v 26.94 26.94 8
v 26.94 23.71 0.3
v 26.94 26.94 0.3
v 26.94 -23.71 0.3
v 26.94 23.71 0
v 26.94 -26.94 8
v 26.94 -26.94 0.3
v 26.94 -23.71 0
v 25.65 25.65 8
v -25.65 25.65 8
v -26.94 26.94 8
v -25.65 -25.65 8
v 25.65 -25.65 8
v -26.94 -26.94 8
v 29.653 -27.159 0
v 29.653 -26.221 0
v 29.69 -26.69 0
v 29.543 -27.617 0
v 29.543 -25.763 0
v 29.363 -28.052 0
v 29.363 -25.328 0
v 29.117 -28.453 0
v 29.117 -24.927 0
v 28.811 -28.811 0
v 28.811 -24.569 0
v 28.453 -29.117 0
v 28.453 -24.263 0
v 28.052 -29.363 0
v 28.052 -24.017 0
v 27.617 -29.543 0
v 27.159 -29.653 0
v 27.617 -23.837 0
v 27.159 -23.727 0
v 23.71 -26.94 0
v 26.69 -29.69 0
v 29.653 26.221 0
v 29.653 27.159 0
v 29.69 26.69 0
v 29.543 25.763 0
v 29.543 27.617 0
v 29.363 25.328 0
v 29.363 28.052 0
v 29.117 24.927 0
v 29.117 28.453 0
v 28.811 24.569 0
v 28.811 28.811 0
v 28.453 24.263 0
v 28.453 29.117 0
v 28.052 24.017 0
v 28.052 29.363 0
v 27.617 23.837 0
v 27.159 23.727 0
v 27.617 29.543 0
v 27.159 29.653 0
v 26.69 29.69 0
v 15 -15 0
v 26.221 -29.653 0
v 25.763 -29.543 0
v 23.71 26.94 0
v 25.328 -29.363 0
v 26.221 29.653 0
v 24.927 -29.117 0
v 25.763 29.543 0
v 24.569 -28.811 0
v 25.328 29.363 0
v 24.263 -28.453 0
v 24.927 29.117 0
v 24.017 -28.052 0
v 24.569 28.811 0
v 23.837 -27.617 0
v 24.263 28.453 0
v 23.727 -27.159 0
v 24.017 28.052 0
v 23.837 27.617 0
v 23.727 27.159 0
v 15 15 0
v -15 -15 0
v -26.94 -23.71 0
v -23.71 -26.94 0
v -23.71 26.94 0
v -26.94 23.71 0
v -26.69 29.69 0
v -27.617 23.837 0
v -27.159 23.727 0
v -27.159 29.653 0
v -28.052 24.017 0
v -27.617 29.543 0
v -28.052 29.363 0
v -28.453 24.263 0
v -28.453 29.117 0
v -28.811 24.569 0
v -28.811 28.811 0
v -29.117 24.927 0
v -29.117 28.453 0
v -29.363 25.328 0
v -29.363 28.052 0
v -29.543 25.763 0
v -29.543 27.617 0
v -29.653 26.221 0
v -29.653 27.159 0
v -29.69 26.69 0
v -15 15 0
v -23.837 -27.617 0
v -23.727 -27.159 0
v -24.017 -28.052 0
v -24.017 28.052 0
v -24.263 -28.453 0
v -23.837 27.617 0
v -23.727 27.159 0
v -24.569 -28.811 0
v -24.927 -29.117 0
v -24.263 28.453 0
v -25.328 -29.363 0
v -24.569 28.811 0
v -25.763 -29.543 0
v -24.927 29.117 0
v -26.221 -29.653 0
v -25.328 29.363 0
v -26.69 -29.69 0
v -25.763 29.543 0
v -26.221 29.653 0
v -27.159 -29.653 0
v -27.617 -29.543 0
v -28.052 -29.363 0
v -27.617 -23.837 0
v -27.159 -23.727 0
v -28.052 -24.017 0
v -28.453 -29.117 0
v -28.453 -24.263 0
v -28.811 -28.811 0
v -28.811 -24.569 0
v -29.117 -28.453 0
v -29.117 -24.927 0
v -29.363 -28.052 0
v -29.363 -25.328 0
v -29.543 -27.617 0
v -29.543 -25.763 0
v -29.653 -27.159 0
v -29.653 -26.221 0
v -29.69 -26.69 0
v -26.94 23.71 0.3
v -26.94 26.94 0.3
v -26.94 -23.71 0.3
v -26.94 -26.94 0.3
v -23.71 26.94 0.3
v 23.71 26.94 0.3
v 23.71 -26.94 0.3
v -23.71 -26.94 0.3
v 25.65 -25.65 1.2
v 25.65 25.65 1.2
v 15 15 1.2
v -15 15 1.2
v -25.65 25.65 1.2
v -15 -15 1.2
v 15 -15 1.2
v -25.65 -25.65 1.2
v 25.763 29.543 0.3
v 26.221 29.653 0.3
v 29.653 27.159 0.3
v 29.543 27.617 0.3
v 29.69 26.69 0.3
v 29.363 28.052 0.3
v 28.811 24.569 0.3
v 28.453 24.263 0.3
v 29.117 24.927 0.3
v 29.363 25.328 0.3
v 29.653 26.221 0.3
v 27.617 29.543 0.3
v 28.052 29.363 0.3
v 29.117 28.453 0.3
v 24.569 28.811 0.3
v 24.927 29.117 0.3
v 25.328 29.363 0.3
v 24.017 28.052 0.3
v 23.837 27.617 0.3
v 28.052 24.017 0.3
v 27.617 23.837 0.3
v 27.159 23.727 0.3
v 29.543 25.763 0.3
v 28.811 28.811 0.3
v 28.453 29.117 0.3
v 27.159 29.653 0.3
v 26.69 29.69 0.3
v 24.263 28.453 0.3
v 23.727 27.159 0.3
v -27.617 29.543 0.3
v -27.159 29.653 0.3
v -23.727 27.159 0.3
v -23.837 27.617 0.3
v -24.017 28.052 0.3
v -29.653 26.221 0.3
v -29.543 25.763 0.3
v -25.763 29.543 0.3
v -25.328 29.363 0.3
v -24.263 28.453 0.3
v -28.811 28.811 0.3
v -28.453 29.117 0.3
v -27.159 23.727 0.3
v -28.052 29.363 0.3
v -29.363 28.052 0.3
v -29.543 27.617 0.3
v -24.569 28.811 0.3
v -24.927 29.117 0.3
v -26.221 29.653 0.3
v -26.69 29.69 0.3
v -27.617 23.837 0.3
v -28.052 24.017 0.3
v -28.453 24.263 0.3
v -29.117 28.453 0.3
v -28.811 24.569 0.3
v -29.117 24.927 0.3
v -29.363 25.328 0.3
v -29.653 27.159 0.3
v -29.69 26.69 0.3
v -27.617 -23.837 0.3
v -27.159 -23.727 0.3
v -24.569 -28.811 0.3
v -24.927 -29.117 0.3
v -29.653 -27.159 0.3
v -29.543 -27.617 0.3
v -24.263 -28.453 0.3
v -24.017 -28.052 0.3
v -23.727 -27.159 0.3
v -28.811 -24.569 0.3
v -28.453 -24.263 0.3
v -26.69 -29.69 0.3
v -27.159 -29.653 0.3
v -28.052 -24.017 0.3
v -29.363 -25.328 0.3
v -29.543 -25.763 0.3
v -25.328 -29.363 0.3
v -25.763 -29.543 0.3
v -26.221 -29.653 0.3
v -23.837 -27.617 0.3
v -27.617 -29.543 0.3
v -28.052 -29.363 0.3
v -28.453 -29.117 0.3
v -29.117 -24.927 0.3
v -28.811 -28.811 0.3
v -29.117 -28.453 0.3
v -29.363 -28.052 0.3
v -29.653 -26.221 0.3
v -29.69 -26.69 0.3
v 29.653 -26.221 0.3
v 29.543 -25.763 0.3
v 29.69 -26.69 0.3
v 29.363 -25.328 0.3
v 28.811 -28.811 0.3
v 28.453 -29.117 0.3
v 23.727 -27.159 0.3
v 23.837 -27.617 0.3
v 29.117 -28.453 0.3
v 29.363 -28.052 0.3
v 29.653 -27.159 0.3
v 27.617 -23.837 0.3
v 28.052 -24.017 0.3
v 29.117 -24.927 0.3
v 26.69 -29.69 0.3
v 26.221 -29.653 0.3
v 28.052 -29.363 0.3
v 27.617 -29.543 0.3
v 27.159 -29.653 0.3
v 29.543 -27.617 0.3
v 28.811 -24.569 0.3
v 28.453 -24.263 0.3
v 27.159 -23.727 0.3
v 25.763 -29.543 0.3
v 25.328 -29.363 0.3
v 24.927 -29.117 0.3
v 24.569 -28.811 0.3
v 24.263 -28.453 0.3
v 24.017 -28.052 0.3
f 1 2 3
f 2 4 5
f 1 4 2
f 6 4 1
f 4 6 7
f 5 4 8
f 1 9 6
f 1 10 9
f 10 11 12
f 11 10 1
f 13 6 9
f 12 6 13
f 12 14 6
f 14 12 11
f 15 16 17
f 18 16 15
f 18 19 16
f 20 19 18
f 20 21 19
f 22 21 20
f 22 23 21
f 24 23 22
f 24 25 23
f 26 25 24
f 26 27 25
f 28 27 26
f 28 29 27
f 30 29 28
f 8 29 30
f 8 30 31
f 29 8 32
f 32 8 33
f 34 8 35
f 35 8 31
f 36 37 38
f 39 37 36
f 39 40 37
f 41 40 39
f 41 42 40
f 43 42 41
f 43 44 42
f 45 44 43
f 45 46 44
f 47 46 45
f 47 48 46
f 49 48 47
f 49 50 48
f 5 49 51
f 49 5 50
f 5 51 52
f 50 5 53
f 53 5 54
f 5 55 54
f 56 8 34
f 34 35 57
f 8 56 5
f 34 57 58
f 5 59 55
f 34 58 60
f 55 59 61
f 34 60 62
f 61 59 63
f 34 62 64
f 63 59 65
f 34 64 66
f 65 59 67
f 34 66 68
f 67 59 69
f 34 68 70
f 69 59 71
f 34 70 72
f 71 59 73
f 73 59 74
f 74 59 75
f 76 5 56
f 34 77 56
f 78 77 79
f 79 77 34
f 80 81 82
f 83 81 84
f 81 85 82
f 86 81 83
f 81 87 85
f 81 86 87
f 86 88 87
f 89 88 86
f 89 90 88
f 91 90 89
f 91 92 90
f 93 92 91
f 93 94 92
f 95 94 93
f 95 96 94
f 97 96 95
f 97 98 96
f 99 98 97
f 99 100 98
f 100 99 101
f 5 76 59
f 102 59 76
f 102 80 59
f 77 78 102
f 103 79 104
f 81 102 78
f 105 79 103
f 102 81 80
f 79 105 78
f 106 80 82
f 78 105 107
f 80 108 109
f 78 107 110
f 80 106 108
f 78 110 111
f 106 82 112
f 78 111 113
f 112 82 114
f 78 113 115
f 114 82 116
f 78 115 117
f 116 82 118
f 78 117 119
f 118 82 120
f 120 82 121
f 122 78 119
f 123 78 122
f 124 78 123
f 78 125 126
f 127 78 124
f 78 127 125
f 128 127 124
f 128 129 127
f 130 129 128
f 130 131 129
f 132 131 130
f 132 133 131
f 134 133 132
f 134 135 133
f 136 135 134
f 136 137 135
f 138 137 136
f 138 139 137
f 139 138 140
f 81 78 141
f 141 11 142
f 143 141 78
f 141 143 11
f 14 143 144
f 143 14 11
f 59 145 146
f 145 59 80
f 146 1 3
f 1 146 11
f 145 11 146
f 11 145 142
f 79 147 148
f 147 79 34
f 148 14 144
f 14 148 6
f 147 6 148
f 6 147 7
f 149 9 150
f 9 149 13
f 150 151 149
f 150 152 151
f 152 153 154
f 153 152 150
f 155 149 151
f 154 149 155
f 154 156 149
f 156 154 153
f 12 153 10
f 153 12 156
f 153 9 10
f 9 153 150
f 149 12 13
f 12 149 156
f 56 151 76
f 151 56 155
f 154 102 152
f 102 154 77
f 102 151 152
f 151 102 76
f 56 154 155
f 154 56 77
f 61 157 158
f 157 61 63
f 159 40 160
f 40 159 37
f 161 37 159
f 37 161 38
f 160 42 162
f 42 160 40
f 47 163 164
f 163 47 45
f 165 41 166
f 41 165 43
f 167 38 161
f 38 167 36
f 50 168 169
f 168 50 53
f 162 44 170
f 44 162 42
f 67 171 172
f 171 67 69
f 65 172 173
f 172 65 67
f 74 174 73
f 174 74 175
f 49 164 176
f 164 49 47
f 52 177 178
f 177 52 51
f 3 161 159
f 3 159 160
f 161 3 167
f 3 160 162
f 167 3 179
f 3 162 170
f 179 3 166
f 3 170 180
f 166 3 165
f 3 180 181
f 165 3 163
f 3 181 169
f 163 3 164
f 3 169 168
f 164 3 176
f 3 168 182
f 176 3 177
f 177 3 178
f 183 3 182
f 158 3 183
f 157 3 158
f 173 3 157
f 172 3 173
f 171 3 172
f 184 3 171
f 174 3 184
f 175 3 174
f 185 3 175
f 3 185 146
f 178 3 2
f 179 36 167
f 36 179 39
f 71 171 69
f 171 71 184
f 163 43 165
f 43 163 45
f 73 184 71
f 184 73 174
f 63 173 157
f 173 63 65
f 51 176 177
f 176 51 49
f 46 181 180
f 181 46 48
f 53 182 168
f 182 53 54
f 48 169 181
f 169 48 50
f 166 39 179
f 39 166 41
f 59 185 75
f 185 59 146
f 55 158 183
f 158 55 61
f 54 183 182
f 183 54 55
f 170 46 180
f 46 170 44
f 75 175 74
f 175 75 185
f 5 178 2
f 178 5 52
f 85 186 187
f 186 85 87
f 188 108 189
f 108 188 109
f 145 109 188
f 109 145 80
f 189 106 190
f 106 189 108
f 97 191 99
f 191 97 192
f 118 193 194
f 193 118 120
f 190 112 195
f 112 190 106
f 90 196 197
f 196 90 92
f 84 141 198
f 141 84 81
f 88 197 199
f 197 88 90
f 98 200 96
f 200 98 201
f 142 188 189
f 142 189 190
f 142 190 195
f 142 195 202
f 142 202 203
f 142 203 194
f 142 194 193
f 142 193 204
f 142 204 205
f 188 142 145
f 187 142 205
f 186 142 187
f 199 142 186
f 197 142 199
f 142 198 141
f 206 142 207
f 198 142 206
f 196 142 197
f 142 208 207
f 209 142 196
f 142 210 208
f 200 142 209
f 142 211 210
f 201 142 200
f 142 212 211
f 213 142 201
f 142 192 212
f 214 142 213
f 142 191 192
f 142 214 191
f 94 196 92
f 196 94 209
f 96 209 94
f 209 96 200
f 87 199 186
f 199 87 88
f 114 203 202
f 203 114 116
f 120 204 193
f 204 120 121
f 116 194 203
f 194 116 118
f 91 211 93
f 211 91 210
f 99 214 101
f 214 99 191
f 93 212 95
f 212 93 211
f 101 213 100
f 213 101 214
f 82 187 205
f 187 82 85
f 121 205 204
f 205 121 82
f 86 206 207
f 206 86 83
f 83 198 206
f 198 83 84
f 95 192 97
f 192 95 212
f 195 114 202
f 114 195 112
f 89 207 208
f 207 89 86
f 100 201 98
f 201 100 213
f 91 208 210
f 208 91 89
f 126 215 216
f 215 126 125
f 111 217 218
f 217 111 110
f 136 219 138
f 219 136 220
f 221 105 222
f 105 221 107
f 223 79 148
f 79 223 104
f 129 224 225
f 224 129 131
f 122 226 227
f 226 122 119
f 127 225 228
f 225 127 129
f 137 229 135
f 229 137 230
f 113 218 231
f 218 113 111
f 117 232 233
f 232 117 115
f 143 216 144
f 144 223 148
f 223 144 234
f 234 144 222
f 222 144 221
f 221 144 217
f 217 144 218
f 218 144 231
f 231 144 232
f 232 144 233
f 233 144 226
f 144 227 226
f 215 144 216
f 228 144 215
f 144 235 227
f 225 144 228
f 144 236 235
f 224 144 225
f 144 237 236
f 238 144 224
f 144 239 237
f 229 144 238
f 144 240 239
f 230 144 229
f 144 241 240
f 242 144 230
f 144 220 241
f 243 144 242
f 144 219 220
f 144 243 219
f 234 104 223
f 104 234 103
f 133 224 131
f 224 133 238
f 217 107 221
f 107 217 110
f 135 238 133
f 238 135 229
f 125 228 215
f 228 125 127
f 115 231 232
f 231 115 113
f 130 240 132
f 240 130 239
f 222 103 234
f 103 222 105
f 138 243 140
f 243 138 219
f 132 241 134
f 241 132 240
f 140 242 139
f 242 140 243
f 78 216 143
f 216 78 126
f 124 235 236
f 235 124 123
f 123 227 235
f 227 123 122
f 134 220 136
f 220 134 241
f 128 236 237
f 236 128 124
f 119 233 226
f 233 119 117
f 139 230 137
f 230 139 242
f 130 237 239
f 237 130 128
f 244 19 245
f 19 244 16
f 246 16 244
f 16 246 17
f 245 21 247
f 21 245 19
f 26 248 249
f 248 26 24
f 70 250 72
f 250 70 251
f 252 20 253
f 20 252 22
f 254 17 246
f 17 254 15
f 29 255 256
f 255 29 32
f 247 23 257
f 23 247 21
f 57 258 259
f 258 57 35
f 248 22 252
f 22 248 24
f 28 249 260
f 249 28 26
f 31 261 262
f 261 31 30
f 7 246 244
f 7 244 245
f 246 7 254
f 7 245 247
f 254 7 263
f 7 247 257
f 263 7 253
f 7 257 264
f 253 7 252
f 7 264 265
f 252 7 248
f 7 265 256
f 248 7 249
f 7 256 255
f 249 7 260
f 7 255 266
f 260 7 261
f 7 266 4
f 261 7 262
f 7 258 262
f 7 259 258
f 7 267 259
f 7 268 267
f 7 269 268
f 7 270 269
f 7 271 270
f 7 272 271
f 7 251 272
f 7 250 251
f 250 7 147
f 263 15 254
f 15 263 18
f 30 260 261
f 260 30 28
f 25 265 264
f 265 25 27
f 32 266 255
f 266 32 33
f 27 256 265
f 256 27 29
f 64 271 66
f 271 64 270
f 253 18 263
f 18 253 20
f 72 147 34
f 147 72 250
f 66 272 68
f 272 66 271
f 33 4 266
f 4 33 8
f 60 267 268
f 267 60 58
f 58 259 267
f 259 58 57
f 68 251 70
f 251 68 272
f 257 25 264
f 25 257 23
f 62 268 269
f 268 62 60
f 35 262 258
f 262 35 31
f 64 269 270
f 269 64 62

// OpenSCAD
// note: this is for 2x2 only
//

tileWidth = 50.8;
slop = 0.25;
height = 8;

wallThick = 1.29; // prusa suggested for 3 perimeters

translate ([tileWidth/2+wallThick,tileWidth/2+wallThick,0]) cylinder($fn=40,r=3,h=0.3);
translate ([-tileWidth/2-wallThick,tileWidth/2+wallThick,0]) cylinder($fn=40,r=3,h=0.3);
translate ([-tileWidth/2-wallThick,-tileWidth/2-wallThick,0]) cylinder($fn=40,r=3,h=0.3);
translate ([tileWidth/2+wallThick,-tileWidth/2-wallThick,0]) cylinder($fn=40,r=3,h=0.3);

difference() {
   translate([0,0,height/2]) cube([tileWidth+2*slop+2*wallThick,
                                   tileWidth+2*slop+2*wallThick,
                                   height],center=true);

   translate([0,0,height/2+1.2]) cube([tileWidth+2*slop,
                                       tileWidth+2*slop,height],center=true);

   translate([0,0,0.99]) cube([30,30,2],center=true);
}
